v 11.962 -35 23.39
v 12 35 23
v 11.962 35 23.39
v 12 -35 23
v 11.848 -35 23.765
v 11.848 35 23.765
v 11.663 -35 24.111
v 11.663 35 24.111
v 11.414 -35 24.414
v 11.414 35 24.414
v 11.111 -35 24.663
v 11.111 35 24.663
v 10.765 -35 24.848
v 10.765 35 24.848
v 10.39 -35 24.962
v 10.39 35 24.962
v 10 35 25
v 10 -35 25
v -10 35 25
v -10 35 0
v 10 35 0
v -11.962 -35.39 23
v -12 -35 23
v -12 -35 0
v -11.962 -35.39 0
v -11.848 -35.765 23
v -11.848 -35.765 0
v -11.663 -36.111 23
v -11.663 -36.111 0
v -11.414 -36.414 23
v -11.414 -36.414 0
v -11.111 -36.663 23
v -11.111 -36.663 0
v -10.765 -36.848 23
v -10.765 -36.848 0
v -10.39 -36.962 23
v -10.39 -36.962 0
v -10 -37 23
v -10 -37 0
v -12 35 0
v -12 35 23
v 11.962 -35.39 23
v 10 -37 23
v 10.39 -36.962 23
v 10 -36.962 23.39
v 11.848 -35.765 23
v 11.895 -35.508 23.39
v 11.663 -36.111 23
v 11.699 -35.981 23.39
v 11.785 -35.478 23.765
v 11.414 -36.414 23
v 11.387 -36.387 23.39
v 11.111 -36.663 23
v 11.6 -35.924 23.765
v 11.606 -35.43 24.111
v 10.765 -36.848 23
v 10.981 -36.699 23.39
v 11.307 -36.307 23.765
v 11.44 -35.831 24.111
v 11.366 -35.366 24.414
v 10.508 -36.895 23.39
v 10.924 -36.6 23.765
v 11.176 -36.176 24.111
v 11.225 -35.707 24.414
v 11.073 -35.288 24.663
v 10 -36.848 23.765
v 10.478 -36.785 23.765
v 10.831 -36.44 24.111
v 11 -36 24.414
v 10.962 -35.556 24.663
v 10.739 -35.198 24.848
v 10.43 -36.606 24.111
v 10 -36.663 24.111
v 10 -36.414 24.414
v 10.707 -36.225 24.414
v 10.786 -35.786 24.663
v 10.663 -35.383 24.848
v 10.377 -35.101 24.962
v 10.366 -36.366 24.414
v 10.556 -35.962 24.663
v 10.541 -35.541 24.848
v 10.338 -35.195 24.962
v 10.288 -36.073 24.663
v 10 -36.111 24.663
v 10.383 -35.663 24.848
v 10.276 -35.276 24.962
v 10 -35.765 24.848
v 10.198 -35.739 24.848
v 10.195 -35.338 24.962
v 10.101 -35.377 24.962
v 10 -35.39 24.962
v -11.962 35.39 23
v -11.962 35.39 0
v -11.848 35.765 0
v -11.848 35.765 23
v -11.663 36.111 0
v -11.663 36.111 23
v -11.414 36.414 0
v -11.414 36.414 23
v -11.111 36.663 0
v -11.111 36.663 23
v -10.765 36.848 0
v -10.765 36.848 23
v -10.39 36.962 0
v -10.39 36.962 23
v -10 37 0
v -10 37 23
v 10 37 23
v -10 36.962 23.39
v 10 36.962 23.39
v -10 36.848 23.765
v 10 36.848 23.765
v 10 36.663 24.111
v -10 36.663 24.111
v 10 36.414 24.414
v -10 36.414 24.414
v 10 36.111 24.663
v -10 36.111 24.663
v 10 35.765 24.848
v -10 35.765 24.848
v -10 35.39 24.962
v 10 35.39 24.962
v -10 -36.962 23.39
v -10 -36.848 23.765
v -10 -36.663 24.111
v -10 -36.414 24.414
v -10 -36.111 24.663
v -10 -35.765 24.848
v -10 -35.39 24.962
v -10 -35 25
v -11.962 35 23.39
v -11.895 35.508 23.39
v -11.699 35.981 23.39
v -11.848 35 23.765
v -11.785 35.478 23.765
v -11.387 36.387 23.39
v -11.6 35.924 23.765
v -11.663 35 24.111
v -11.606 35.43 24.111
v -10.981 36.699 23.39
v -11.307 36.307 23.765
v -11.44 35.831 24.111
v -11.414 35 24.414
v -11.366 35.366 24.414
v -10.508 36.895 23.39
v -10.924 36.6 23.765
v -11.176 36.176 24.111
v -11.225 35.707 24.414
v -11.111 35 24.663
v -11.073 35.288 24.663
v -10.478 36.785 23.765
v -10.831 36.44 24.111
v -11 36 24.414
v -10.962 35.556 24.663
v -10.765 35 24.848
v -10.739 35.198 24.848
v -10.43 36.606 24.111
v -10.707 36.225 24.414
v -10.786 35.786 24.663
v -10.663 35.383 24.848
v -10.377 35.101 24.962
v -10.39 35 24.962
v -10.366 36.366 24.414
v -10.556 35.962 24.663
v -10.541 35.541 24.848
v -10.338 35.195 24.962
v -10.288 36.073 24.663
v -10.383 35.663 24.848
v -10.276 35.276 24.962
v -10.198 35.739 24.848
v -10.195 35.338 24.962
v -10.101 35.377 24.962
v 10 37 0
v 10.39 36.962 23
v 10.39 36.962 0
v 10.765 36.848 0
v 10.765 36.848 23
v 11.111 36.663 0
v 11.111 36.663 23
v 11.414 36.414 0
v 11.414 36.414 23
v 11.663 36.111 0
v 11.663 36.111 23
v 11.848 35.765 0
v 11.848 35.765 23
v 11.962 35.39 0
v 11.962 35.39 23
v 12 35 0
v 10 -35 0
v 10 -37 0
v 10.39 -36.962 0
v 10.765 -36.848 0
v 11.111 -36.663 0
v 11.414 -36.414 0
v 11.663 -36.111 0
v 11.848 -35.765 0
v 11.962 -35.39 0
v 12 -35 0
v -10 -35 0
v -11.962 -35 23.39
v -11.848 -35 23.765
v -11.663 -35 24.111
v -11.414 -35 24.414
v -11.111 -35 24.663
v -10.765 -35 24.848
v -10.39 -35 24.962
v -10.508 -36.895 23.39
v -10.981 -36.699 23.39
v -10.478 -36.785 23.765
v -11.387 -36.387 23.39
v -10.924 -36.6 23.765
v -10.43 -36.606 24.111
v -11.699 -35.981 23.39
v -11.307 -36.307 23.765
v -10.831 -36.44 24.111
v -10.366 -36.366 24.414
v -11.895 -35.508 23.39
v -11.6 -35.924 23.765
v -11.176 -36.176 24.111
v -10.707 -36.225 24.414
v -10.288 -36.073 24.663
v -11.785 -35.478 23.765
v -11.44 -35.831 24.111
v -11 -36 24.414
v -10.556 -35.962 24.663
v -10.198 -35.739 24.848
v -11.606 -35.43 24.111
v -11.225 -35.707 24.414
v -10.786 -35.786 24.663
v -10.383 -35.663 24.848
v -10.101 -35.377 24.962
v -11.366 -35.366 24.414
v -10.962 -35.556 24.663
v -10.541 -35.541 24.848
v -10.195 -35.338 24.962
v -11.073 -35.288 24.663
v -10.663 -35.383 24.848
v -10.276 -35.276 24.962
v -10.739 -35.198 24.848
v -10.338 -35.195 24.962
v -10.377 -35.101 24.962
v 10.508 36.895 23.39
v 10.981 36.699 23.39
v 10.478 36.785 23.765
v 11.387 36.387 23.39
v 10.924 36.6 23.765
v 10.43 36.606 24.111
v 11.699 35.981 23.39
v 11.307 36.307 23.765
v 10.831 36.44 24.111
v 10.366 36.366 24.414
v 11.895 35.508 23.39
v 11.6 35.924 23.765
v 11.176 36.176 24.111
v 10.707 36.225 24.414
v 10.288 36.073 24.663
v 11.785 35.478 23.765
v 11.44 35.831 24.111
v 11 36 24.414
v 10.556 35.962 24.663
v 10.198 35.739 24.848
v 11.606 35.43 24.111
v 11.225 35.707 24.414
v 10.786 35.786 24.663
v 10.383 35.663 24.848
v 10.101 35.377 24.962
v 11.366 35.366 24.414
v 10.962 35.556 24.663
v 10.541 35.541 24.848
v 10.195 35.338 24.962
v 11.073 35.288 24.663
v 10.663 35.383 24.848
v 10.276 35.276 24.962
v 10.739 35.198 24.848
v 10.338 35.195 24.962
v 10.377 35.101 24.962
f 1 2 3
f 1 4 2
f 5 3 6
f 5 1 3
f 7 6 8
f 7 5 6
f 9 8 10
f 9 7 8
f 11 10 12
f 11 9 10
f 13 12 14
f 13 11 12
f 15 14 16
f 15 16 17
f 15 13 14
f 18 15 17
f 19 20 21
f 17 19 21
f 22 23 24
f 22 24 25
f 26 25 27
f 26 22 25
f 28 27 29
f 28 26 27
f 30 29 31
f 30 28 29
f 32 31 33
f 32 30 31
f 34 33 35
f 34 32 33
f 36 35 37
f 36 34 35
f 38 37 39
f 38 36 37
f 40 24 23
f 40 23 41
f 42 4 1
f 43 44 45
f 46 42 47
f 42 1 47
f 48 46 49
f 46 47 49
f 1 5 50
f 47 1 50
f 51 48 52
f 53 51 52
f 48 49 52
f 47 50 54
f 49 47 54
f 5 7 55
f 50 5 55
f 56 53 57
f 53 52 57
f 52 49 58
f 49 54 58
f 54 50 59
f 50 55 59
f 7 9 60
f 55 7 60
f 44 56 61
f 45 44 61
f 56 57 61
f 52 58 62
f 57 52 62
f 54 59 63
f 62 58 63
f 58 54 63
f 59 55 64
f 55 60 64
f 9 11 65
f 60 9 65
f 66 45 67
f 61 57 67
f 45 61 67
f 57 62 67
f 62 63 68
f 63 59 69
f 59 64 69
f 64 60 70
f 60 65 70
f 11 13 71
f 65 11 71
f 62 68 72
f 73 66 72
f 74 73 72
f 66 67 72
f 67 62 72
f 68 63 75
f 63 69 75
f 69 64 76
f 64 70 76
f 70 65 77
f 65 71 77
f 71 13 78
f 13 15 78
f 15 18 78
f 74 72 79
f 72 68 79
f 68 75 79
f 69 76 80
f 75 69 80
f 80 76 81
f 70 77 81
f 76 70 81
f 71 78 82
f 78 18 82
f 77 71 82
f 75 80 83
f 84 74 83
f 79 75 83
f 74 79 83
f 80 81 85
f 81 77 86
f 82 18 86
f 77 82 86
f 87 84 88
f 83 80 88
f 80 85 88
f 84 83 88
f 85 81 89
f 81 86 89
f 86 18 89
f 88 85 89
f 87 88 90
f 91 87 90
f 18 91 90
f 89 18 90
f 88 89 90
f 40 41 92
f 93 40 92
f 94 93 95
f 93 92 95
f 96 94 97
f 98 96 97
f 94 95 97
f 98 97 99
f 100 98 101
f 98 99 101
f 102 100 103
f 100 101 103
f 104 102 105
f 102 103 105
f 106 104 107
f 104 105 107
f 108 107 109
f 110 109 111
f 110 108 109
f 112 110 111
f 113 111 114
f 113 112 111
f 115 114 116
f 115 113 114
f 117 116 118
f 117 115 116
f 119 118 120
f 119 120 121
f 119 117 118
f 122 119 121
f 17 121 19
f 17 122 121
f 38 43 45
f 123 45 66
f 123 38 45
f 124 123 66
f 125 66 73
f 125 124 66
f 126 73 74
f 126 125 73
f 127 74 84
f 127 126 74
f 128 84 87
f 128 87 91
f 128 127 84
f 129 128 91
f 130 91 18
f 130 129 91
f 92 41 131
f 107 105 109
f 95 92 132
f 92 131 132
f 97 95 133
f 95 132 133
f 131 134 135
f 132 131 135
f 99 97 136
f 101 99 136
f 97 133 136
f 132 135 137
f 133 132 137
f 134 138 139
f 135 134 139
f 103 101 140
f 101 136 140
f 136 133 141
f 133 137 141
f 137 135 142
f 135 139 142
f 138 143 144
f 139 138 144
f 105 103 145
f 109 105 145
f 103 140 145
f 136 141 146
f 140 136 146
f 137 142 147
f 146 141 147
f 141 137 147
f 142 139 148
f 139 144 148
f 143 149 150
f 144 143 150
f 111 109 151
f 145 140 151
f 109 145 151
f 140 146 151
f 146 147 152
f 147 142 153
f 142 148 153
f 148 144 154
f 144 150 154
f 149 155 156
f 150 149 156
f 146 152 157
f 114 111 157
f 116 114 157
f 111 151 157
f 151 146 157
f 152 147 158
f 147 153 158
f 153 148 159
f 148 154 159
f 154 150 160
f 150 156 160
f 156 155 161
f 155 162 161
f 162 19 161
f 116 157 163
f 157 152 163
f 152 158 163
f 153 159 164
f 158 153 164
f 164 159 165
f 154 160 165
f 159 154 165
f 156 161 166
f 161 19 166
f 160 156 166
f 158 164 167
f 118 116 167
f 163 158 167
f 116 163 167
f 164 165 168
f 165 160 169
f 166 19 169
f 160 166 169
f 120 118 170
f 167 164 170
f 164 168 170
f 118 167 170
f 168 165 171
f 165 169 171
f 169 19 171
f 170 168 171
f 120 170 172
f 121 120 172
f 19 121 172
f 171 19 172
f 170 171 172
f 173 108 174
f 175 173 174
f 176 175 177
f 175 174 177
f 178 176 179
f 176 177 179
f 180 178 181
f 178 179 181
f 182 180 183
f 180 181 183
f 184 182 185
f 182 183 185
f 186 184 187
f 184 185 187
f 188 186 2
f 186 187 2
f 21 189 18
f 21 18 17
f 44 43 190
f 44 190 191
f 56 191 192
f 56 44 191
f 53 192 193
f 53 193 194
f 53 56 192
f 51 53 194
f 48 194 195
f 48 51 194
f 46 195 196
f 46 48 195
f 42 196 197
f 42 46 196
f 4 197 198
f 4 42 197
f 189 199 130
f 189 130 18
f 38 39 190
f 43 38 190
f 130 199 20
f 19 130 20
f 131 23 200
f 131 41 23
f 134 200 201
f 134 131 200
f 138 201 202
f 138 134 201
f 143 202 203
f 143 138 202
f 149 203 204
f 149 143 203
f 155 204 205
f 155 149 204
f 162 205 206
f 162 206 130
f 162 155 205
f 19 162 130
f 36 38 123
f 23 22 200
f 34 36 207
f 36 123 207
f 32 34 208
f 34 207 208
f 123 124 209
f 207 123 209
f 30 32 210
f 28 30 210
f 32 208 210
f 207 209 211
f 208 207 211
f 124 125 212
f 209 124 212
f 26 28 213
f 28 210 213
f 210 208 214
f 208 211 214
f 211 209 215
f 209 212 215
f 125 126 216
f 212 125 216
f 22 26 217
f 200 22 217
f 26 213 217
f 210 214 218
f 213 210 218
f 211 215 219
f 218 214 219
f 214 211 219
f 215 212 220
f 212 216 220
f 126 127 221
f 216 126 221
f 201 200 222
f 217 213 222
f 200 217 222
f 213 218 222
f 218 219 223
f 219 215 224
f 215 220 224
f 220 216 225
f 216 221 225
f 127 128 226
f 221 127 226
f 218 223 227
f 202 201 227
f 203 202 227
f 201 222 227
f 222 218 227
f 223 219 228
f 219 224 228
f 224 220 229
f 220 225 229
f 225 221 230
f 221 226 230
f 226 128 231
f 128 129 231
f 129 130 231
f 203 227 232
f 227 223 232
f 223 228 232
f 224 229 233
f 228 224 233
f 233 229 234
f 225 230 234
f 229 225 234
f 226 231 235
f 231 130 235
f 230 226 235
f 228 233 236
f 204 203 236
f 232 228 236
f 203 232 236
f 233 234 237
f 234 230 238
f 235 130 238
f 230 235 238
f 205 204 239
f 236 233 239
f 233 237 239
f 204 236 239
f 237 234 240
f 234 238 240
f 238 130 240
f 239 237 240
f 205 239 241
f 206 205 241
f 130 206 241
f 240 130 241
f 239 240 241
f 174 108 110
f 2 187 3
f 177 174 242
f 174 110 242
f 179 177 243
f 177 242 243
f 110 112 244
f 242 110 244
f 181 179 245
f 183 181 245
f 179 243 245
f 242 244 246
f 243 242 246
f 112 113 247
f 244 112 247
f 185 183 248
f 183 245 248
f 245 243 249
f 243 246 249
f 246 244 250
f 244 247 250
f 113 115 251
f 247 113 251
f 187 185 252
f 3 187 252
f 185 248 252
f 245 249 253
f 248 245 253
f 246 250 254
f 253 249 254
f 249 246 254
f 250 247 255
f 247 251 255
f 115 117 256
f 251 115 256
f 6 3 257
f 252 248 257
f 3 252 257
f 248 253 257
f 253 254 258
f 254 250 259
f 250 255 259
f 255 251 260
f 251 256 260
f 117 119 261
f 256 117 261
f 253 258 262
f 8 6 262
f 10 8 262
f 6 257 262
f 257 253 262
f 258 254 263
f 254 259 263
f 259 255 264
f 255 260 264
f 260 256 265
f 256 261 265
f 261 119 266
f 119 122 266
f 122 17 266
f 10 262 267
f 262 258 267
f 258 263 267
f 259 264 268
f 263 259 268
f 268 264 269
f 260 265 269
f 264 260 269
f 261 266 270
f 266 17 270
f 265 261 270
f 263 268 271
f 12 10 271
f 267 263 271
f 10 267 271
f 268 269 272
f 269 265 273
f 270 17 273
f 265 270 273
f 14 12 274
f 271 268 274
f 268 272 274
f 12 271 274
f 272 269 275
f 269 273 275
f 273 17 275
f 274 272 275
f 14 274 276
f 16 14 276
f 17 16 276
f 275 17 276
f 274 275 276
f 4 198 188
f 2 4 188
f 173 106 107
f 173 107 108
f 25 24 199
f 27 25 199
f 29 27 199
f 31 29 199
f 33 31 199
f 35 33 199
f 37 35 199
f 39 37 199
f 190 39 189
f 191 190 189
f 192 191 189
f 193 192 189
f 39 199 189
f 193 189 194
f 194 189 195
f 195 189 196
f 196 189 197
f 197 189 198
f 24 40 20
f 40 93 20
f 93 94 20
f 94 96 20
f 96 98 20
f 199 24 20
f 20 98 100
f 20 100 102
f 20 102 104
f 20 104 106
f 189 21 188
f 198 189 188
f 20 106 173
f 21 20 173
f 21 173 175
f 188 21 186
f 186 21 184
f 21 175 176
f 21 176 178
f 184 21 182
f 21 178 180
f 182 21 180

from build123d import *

# Parameters (mm, degrees)
F0_W     = 24
F0_H     = 74
F0_W_2   = 20
F0_H_2   = 70
F1_DEPTH = 25
F2_R     = 2
F3_R     = 1.99999


# Not quite as in the source:
# - a fillet or chamfer is up to 0.001 mm smaller than in the source, because OpenCascade refuses the exact size


with BuildPart() as f1:
    # F0 (on Top) → F1 (new body)
    with BuildSketch(Plane.XY):
        Rectangle(F0_W, F0_H)
        Rectangle(F0_W_2, F0_H_2, mode=Mode.SUBTRACT)
    extrude(amount=F1_DEPTH)

    # F2
    f2_edges = [f1.edges().sort_by_distance(p)[0] for p in [
        (-12, -37, 12.5),
        (12, -37, 12.5),
        (12, 37, 12.5),
        (-12, 37, 12.5),
    ]]
    fillet(f2_edges, radius=F2_R)

    # F3 (radius 2 in the source; OpenCascade refuses exactly that, so slightly less here)
    f3_edges = [f1.edges().sort_by_distance(p)[0] for p in [
        (-12, 0, 25),
    ]]
    fillet(f3_edges, radius=F3_R)


solid = f1.part
